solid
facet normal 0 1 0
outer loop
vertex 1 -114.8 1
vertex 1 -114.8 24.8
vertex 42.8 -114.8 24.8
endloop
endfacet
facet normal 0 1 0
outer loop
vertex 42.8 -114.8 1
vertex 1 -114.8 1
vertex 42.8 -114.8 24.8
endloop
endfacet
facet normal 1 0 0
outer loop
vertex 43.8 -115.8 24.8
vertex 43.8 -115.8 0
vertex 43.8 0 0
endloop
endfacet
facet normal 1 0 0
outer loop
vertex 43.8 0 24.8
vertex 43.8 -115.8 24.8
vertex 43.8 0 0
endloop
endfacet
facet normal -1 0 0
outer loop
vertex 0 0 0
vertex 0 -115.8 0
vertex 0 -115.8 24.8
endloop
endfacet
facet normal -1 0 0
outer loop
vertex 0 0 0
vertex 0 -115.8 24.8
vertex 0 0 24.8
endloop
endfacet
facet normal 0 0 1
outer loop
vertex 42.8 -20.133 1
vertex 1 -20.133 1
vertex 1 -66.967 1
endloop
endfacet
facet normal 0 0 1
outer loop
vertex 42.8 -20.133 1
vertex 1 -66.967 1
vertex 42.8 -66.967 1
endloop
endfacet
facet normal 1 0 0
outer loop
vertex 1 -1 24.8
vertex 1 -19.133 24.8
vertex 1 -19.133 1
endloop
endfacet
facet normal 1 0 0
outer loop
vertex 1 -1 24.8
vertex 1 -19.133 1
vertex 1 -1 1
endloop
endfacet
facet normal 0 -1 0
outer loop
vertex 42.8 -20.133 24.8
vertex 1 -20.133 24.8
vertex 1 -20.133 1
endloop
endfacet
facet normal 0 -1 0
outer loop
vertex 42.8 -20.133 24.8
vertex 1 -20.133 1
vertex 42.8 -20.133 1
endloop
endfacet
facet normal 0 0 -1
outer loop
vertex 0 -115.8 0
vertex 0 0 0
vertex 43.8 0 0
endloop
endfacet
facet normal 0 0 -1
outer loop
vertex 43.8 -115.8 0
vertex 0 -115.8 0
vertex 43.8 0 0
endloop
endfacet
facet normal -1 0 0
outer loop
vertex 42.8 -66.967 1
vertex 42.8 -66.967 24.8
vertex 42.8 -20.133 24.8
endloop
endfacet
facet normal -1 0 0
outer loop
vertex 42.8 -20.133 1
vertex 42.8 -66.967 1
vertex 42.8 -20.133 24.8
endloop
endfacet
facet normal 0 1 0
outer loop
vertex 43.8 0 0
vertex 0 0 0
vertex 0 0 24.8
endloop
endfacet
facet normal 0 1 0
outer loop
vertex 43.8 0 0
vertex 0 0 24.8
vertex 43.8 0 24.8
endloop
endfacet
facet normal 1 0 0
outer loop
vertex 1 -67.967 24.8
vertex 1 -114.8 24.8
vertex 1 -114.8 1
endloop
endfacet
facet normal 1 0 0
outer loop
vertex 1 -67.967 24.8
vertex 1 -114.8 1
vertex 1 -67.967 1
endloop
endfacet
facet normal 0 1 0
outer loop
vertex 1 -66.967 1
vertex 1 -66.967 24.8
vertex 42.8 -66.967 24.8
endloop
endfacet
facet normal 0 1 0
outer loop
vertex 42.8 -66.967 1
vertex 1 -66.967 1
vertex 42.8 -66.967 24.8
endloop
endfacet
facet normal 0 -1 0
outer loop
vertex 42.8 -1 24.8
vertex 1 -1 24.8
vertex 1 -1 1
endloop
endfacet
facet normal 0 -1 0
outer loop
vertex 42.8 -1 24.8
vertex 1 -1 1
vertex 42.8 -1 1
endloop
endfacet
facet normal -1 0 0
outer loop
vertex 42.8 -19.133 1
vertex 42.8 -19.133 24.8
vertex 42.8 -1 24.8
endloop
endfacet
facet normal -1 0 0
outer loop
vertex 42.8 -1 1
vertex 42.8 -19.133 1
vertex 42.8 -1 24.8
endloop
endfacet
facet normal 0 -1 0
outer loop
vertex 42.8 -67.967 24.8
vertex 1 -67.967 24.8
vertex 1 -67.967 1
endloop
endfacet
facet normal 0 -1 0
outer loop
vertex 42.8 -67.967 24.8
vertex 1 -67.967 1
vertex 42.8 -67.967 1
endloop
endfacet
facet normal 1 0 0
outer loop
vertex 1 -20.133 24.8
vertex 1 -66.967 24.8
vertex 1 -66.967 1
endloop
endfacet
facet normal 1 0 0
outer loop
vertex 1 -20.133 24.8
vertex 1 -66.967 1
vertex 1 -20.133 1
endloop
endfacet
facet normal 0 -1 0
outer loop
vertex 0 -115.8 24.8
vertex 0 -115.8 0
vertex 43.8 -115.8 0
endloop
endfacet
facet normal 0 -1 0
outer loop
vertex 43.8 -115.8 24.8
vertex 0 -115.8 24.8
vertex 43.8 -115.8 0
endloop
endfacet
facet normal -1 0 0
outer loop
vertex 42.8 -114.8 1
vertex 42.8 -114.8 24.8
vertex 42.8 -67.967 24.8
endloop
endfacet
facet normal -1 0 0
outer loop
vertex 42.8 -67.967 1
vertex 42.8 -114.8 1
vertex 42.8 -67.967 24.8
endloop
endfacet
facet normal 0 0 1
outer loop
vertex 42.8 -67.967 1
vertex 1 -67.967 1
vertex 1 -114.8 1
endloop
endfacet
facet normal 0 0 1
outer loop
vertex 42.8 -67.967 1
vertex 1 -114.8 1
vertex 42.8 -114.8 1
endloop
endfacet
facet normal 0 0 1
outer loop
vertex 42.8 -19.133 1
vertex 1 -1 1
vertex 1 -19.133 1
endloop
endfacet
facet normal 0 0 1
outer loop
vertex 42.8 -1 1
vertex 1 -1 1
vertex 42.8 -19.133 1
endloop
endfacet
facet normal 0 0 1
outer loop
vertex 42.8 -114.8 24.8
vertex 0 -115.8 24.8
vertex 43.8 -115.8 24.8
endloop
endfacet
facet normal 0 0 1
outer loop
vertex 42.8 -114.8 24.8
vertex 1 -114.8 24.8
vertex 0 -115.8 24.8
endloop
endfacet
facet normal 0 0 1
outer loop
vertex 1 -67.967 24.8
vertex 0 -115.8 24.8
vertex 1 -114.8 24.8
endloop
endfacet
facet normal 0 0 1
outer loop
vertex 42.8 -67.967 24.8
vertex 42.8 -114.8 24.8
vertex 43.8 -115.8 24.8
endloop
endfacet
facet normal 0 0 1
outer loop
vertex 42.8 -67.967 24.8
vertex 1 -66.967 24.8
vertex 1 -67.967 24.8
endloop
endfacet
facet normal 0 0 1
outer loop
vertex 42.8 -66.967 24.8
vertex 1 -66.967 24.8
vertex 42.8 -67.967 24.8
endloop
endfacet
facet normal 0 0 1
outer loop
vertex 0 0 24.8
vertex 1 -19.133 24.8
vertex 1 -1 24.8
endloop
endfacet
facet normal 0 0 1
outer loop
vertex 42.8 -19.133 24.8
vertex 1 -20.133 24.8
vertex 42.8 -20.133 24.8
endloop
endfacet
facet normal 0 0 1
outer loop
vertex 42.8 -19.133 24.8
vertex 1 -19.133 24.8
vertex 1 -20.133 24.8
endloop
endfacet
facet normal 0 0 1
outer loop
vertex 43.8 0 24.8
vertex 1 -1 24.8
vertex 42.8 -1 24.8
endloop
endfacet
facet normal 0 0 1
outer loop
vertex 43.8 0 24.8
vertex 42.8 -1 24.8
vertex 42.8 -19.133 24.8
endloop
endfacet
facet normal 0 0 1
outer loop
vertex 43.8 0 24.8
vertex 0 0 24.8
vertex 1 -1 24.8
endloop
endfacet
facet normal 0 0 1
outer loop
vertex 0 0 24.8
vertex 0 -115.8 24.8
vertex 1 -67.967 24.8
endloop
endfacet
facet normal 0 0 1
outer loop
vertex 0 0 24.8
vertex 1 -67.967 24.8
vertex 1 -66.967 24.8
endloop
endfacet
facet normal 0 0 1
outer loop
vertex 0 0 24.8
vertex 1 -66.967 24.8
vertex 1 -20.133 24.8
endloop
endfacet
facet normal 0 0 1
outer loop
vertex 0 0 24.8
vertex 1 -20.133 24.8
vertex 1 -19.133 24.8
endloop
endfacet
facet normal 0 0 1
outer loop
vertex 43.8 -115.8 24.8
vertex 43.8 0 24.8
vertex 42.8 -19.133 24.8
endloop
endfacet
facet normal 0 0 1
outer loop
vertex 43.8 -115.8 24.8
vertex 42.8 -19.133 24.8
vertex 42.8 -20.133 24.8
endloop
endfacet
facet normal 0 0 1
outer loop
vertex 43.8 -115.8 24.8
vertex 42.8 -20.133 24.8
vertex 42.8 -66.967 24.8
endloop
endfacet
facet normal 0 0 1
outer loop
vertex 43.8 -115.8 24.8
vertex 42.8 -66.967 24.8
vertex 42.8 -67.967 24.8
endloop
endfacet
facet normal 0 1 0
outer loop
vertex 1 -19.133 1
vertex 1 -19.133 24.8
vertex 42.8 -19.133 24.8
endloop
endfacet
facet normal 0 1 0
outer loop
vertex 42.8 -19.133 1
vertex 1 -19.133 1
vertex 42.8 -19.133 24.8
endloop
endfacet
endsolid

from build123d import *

# Parameters (mm, degrees)
F0_W     = 43.8
F0_H     = 115.8
F1_DEPTH = 24.8
F2_W     = 41.8
F2_H     = 18.133333
F2_H_2   = 46.833334
F2_H_3   = 46.833333
F3_DEPTH = 23.8


with BuildPart() as f1:
    # F0 (on Top) → F1 (new body)
    with BuildSketch(Plane.XY):
        with Locations((21.9, -57.9)):
            Rectangle(F0_W, F0_H)
    extrude(amount=F1_DEPTH)

    # F2 (on face) → F3 (cut)
    with BuildSketch(Plane.XY.offset(24.8)):
        with Locations((21.9, -10.066667)):
            Rectangle(F2_W, F2_H)
        with Locations((21.9, -43.55)):
            Rectangle(F2_W, F2_H_2)
        with Locations((21.9, -91.383333)):
            Rectangle(F2_W, F2_H_3)
    extrude(amount=-F3_DEPTH, mode=Mode.SUBTRACT)


solid = f1.part
